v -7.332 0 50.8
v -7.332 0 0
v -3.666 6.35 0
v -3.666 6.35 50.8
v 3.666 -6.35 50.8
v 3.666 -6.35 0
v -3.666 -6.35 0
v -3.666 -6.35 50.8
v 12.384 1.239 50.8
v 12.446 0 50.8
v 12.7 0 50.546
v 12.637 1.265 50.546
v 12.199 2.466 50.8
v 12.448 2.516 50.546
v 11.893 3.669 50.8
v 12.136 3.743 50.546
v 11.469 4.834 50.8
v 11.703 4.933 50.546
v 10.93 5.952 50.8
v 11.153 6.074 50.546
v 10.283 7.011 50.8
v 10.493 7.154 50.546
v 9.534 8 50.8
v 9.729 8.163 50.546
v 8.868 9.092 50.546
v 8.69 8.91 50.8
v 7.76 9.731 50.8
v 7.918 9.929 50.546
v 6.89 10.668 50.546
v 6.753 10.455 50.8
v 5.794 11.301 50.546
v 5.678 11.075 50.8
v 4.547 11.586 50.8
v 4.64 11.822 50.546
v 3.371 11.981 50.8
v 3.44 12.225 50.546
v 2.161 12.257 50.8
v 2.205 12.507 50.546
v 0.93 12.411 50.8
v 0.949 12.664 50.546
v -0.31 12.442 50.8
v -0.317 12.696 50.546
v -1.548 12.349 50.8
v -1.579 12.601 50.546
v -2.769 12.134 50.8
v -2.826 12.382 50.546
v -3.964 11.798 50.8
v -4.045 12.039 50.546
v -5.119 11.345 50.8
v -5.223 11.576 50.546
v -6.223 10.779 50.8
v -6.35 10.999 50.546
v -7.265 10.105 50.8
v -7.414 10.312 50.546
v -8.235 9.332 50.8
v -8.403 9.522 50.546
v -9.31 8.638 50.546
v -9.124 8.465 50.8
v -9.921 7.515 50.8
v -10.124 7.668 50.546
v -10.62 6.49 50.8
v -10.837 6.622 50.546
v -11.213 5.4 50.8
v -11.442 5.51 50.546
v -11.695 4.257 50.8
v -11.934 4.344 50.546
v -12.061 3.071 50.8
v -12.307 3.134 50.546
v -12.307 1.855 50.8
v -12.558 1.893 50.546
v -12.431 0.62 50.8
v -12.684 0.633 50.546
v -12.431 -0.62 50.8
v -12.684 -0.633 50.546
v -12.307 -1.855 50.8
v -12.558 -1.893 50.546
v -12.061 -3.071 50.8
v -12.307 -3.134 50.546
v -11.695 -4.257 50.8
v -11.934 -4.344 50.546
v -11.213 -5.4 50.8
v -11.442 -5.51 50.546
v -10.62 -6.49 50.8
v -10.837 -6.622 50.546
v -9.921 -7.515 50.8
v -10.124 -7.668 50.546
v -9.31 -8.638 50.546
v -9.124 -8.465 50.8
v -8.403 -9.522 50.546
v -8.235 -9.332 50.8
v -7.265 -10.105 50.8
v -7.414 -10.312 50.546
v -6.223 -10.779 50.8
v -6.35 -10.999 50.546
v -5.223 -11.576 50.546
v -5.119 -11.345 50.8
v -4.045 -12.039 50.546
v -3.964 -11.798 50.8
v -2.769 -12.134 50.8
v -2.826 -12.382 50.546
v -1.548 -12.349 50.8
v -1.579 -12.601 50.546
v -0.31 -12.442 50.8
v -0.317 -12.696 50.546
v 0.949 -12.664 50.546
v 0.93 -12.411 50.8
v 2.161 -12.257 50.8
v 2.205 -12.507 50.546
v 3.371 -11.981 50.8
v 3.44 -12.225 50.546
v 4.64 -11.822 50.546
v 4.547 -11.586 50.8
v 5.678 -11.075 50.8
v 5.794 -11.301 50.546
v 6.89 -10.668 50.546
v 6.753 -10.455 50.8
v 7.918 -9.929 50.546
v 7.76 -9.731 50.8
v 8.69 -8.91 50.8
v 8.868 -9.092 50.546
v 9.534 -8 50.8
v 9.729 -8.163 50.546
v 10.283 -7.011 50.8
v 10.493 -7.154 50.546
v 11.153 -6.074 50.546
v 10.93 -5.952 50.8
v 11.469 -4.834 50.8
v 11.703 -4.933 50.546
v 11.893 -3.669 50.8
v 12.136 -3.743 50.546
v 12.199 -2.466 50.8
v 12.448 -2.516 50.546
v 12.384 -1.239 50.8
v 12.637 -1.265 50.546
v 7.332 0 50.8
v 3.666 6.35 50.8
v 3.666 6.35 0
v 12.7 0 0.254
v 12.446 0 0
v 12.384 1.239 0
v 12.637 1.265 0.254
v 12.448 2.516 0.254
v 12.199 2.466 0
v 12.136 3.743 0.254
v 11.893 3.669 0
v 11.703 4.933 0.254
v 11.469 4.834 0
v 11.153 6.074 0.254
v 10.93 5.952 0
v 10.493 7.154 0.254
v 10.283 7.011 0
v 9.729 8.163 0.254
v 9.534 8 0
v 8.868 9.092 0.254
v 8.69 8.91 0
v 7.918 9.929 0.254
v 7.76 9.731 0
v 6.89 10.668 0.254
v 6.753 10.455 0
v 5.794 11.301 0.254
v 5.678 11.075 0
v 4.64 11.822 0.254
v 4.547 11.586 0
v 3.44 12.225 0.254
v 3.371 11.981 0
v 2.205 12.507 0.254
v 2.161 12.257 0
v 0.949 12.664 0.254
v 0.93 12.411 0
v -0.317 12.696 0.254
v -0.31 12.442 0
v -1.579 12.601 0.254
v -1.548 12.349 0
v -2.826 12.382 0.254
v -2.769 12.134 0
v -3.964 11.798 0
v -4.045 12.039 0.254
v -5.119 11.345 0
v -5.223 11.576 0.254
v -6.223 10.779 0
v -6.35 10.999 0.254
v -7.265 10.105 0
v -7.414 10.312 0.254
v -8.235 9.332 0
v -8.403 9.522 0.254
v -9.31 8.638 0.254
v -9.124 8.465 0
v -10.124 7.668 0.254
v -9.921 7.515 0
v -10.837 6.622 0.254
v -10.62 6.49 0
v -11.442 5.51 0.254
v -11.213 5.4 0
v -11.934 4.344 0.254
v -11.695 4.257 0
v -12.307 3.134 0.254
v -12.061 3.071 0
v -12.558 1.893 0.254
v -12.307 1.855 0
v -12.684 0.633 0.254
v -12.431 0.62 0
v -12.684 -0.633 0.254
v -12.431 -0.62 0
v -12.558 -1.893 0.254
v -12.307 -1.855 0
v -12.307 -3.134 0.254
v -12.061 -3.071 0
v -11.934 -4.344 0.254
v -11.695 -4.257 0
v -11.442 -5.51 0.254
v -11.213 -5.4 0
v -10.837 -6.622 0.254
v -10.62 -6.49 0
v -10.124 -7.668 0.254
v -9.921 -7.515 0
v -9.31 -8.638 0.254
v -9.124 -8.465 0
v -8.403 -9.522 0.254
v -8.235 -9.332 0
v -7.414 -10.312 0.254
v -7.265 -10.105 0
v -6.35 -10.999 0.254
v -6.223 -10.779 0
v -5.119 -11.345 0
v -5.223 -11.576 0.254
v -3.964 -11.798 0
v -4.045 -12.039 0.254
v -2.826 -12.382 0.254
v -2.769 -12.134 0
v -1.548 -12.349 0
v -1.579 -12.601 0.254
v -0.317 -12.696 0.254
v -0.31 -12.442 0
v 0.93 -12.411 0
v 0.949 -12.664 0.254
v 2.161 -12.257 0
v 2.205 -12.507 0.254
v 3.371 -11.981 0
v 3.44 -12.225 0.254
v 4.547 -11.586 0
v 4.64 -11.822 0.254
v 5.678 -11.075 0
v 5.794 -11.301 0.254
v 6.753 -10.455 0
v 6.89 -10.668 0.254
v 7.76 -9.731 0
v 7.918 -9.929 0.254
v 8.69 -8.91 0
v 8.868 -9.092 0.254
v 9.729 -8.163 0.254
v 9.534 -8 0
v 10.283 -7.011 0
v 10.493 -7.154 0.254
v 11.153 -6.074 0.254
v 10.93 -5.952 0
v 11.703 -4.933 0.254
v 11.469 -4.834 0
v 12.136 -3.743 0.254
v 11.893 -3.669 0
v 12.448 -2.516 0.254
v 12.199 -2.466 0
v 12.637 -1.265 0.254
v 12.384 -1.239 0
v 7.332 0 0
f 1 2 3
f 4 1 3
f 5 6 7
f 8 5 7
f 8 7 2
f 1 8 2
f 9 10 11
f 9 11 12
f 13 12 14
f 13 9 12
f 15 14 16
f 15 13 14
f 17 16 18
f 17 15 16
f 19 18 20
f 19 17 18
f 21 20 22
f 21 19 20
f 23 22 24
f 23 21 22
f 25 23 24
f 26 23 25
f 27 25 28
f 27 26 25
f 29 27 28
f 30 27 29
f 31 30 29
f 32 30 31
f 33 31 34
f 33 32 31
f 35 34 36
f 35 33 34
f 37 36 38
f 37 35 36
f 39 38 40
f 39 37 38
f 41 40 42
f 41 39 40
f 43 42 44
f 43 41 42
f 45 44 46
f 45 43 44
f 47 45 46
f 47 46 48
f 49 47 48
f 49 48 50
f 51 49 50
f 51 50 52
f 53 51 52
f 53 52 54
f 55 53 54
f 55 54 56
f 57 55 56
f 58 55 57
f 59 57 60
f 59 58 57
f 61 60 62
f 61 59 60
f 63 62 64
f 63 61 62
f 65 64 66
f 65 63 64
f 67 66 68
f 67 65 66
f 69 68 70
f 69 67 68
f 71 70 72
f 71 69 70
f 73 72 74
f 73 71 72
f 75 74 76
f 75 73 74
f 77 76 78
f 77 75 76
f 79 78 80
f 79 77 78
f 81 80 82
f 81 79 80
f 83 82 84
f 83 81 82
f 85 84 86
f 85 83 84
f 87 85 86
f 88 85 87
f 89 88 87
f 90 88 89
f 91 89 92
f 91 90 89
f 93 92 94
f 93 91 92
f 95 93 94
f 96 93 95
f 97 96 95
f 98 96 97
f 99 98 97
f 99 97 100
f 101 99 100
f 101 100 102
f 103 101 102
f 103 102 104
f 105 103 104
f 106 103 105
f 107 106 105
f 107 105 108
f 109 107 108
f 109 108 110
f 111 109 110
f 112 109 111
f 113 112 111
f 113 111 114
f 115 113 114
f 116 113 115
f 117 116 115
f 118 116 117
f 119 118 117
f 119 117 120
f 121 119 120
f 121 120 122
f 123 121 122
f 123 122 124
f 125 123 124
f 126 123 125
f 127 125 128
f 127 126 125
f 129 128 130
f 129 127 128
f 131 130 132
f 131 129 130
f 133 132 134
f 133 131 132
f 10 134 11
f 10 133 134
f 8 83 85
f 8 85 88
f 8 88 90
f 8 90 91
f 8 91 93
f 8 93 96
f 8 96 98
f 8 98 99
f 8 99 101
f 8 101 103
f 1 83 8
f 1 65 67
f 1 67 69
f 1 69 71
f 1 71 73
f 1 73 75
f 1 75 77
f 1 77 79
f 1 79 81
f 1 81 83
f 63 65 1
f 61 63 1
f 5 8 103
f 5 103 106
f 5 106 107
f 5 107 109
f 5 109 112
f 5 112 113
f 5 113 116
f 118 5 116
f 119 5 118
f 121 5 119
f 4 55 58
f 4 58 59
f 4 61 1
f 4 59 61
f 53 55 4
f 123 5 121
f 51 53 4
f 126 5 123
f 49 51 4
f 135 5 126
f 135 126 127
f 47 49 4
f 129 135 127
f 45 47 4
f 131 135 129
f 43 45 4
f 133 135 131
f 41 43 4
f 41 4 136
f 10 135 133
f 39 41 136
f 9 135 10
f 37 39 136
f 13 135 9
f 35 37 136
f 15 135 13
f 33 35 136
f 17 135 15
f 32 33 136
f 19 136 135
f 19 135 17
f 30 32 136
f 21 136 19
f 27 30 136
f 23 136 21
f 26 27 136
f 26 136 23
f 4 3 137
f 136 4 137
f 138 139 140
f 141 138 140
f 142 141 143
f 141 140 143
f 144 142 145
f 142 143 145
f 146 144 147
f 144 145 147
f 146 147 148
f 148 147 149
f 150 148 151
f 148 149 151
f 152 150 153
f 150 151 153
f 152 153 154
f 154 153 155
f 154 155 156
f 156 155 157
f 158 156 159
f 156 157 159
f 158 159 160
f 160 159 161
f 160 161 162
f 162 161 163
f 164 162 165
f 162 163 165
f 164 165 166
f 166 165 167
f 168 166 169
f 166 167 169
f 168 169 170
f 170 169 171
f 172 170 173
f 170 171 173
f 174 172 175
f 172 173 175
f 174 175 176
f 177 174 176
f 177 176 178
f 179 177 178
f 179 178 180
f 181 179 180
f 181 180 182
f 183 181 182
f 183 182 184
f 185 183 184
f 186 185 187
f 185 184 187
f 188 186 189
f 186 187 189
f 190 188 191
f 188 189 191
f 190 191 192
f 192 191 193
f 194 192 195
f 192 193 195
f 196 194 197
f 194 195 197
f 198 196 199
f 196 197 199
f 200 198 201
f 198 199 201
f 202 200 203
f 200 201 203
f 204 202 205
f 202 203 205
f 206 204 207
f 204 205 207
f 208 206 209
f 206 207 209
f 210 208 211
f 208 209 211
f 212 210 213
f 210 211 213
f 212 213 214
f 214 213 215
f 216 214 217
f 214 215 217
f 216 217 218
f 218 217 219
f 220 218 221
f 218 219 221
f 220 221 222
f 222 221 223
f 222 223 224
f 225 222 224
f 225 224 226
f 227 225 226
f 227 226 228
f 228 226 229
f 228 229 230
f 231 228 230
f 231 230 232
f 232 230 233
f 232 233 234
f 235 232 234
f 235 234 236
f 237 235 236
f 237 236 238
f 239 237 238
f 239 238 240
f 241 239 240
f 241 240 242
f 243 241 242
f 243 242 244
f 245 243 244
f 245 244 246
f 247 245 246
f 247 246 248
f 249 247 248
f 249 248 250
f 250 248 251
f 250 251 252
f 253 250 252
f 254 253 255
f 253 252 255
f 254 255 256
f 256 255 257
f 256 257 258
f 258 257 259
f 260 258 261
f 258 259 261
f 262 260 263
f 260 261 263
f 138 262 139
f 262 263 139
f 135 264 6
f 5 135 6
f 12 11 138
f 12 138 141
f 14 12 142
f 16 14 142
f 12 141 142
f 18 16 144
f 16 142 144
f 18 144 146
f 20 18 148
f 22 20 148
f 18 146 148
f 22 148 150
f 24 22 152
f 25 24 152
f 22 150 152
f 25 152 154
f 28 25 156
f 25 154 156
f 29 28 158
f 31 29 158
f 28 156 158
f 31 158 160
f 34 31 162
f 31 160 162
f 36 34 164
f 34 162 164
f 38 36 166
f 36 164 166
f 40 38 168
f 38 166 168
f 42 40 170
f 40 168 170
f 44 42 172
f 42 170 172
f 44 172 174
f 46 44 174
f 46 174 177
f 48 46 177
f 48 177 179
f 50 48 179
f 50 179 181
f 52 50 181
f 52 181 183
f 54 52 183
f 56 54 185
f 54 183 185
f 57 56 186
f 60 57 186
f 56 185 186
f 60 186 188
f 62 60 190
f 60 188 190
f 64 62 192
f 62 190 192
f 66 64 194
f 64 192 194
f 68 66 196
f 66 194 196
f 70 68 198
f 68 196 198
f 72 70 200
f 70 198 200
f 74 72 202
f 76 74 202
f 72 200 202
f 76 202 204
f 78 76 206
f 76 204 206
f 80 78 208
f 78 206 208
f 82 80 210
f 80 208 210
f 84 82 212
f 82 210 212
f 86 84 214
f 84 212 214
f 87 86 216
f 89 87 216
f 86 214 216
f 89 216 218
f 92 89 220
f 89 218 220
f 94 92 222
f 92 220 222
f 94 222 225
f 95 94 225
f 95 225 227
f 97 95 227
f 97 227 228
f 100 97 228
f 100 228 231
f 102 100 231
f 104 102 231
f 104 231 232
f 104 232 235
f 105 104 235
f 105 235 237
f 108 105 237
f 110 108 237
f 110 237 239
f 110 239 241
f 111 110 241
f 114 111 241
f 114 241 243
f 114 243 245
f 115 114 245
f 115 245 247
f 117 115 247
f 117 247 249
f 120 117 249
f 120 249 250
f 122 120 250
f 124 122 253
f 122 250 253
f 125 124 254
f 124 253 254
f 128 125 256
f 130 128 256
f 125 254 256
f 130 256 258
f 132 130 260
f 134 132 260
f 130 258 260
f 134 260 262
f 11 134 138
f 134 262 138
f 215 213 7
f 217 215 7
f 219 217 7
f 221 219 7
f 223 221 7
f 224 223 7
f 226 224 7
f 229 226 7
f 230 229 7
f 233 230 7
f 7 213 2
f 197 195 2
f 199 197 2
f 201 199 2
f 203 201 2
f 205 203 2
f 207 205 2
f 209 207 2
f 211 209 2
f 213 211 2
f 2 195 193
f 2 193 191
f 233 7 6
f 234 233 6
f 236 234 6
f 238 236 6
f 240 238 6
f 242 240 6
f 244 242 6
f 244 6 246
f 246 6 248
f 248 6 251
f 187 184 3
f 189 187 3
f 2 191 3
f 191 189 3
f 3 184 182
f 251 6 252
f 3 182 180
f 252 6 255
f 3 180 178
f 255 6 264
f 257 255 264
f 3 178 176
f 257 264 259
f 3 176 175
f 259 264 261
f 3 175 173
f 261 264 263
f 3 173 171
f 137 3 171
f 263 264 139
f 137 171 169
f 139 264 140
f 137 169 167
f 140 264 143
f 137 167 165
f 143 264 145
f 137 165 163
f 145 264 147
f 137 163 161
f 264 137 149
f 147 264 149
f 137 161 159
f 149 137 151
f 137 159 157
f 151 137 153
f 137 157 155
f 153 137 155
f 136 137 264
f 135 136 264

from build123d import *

# Parameters (mm, degrees)
F0_R     = 12.7
F1_DEPTH = 50.8
F2_SIZE  = 0.254


with BuildPart() as f1:
    # F0 (on Top) → F1 (new body)
    with BuildSketch(Plane.XY):
        Circle(F0_R)
        Polygon((-3.666174, 6.35), (3.666174, 6.35), (7.332348, 0), (3.666174, -6.35), (-3.666174, -6.35), (-7.332348, 0), align=None, mode=Mode.SUBTRACT)
    extrude(amount=F1_DEPTH)

    # F2
    f2_edges = [f1.edges().sort_by_distance(p)[0] for p in [
        (-12.7, 0, 50.8),
        (-12.7, 0, 0),
    ]]
    chamfer(f2_edges, length=F2_SIZE)


solid = f1.part
